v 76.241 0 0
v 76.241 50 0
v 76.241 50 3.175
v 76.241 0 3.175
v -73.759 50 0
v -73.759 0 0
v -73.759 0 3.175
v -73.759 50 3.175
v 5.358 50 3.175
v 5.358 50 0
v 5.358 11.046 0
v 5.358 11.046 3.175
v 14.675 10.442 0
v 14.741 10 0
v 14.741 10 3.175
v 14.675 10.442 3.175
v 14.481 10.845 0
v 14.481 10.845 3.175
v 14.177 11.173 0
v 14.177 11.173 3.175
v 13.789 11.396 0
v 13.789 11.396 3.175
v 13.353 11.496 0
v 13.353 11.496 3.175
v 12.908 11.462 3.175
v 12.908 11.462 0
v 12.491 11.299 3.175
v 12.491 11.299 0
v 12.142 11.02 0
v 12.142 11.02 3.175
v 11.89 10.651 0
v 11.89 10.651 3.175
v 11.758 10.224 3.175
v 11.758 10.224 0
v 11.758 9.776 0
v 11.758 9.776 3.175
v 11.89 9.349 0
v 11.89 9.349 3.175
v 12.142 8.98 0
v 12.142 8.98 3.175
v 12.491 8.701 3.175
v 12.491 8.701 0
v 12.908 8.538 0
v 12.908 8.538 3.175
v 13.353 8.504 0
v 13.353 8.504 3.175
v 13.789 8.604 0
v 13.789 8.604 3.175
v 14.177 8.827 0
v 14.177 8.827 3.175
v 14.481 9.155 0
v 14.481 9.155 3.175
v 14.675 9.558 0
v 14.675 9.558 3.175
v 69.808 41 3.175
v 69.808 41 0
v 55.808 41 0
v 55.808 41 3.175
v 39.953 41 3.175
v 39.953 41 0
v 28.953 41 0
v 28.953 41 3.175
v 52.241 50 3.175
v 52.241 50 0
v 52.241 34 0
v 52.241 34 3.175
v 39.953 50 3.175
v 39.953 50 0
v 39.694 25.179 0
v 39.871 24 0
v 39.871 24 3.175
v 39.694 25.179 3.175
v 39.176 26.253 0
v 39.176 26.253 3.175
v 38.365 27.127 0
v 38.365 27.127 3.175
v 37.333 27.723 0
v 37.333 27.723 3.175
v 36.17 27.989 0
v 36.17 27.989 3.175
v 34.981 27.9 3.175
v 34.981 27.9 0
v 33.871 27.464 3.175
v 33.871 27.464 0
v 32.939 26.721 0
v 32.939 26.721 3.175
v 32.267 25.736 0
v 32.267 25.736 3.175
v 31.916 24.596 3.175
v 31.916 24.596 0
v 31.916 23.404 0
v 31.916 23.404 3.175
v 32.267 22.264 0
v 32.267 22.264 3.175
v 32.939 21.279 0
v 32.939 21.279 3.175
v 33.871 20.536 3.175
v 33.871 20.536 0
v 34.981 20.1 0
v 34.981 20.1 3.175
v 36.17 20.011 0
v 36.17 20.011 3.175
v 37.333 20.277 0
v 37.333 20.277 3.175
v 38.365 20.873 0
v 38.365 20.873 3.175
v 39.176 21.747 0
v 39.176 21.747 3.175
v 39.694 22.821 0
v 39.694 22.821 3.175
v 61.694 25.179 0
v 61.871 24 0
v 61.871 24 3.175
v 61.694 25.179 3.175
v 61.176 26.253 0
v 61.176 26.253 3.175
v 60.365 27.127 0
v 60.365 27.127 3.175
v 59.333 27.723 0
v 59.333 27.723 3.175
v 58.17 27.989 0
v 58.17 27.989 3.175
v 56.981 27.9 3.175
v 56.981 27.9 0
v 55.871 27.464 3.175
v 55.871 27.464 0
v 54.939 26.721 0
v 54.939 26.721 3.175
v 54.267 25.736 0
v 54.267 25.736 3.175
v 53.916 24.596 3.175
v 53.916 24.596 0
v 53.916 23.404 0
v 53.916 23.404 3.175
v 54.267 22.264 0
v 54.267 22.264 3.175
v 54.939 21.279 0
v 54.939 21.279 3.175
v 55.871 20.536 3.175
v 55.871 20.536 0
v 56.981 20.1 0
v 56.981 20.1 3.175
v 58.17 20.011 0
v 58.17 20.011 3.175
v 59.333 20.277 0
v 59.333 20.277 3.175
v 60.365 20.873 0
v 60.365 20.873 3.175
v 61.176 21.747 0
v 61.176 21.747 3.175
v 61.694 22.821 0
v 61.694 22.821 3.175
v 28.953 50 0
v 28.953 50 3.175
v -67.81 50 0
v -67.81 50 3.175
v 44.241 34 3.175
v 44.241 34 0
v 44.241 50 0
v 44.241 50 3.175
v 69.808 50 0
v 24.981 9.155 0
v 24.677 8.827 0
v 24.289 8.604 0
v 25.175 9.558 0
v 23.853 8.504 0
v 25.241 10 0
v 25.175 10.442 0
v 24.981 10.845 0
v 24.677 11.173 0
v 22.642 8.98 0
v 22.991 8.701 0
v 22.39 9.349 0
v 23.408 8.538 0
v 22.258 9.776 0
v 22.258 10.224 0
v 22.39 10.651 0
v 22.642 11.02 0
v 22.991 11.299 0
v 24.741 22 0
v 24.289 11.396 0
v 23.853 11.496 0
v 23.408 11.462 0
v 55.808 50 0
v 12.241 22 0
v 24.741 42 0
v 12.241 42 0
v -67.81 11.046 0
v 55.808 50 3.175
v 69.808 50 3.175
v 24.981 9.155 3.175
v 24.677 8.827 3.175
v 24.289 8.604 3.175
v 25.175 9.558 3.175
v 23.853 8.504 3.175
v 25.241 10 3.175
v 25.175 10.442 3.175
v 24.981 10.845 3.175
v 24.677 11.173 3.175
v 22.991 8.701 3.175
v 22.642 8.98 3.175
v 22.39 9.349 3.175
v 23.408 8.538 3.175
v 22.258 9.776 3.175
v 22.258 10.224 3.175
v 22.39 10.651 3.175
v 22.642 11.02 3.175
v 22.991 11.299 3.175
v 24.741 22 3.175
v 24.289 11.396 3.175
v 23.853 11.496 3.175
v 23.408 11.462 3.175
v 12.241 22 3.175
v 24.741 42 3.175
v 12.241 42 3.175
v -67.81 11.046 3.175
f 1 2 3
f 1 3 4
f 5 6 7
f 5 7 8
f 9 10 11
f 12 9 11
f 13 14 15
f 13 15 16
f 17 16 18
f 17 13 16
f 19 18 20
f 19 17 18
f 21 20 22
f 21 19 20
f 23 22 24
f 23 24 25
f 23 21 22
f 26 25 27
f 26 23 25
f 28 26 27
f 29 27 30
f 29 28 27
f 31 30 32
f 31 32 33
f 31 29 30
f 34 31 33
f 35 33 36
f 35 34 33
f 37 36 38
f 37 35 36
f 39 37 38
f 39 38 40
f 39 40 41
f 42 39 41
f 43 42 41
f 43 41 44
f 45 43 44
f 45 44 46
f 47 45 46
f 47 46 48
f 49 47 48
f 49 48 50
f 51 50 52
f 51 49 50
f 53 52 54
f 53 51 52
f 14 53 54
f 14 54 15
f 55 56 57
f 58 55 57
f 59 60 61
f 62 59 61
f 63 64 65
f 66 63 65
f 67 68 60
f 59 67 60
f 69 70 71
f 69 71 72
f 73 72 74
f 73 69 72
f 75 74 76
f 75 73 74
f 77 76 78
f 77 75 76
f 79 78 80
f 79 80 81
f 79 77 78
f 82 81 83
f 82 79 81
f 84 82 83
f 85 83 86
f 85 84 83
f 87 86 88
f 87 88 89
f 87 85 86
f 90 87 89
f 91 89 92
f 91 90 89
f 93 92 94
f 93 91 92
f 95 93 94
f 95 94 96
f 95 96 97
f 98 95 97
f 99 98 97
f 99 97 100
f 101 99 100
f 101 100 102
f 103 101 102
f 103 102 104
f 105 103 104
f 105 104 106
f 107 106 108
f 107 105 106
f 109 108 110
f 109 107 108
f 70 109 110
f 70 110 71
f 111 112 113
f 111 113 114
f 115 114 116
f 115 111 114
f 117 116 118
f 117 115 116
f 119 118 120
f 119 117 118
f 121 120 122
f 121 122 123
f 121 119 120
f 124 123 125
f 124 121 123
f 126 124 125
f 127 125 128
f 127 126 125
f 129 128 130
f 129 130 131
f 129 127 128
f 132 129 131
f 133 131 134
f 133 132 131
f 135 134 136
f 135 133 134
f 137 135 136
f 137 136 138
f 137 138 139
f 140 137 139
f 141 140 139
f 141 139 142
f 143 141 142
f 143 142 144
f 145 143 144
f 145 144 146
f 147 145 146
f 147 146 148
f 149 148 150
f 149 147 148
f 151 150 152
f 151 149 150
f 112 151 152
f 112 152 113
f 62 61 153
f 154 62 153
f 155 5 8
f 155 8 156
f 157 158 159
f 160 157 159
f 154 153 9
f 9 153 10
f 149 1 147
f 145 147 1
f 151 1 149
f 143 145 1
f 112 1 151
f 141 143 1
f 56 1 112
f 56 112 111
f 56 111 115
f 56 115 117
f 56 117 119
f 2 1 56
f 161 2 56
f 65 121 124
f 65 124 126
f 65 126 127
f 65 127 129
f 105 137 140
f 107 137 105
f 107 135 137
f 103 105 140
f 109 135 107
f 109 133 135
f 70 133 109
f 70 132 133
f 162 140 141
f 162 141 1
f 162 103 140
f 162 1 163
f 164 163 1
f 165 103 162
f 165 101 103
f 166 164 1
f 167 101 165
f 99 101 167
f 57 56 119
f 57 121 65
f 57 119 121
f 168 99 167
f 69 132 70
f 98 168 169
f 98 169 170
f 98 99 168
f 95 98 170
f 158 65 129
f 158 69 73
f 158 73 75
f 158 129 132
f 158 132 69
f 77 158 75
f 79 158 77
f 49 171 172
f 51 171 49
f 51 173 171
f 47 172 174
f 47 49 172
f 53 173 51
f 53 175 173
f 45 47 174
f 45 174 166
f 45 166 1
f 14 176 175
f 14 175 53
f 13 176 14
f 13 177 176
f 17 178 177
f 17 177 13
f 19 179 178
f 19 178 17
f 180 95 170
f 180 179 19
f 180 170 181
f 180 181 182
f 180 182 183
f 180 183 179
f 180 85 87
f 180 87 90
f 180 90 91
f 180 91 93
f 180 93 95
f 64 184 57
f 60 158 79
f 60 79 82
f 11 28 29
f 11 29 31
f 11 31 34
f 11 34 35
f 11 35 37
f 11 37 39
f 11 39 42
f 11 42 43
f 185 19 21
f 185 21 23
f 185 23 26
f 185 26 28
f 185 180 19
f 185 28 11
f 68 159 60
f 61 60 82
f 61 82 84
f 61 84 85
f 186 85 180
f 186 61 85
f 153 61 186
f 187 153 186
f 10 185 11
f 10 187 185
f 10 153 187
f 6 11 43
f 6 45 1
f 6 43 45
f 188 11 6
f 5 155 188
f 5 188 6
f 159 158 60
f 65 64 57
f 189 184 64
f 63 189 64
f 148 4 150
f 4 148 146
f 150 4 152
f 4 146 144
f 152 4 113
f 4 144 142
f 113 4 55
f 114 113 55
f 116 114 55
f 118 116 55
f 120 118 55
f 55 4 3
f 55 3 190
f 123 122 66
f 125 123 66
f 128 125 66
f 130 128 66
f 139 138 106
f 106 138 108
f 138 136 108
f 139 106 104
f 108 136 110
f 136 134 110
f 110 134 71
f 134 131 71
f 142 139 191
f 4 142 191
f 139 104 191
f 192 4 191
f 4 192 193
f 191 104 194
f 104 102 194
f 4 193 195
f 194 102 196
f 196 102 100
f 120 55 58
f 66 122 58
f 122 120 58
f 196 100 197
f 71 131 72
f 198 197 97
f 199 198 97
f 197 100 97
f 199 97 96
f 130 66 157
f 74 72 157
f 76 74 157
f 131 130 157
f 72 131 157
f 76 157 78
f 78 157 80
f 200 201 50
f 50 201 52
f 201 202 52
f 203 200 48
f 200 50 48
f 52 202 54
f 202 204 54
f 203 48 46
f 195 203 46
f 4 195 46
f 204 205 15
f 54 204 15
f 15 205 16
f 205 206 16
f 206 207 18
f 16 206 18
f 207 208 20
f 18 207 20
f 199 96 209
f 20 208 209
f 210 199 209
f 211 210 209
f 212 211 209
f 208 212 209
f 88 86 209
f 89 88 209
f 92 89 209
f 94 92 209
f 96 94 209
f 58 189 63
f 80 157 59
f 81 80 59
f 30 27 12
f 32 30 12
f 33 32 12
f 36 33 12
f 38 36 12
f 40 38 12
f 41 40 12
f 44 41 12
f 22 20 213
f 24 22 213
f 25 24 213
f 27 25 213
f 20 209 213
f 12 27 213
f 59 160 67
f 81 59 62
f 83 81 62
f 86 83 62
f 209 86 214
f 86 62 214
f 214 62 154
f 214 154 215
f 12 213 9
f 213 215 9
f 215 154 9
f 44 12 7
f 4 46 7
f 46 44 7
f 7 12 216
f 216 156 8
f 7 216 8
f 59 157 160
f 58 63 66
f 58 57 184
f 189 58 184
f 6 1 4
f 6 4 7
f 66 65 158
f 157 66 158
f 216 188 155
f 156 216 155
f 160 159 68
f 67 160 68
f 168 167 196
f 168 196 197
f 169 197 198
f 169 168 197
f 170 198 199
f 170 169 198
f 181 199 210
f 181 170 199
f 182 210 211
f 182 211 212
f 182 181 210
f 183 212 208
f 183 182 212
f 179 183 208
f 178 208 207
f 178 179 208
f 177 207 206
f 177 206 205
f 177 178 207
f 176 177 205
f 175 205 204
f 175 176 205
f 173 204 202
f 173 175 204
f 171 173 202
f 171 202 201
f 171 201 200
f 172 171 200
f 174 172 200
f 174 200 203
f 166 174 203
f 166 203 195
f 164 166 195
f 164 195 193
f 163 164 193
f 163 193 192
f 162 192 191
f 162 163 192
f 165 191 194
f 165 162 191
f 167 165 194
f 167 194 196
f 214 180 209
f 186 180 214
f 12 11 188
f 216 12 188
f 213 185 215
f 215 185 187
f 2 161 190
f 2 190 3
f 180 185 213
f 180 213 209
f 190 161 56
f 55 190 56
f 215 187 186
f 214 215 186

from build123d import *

# Parameters (mm, degrees)
SKETCH2_R           = 1.5
SKETCH2_R_2         = 4
SKETCH2_W           = 12.5
SKETCH2_H           = 20
BOSS_EXTRUDE1_DEPTH = 3.175
BOSS_EXTRUDE2_DEPTH = 3.175


with BuildPart() as part:
    # Sketch2 → Boss-Extrude1 (new body)
    with BuildSketch(Plane.XY):
        Polygon((-71.75862069, 50), (-71.75862069, 2), (74.24137931, 2), (74.24137931, 50), (69.808349218, 50), (69.808349218, 41), (55.808349218, 41), (55.808349218, 50), (52.24137931, 50), (52.24137931, 34), (44.24137931, 34), (44.24137931, 50), (39.953145567, 50), (39.953145567, 41), (28.953145567, 41), (28.953145567, 50), (5.35837424, 50), (5.35837424, 11.04586532), (-67.810407441, 11.04586532), (-67.810407441, 50), align=None)
        with Locations((23.74137931, 10)):
            Circle(SKETCH2_R, mode=Mode.SUBTRACT)
        with Locations((13.24137931, 10)):
            Circle(SKETCH2_R, mode=Mode.SUBTRACT)
        with Locations((57.871281099, 24)):
            Circle(SKETCH2_R_2, mode=Mode.SUBTRACT)
        with Locations((35.871281099, 24)):
            Circle(SKETCH2_R_2, mode=Mode.SUBTRACT)
        with Locations((18.49137931, 32)):
            Rectangle(SKETCH2_W, SKETCH2_H, mode=Mode.SUBTRACT)
    extrude(amount=BOSS_EXTRUDE1_DEPTH)

    # Sketch3 → Boss-Extrude2 (add)
    with BuildSketch(Plane(origin=(0, 0, 0), x_dir=(-1, 0, 0), z_dir=(0, 0, -1))):
        Polygon((-74.24137931, 50), (-76.24137931, 50), (-76.24137931, 0), (73.75862069, 0), (73.75862069, 50), (71.75862069, 50), (71.75862069, 2), (-74.24137931, 2), align=None)
    extrude(amount=-BOSS_EXTRUDE2_DEPTH)


solid = part.part
